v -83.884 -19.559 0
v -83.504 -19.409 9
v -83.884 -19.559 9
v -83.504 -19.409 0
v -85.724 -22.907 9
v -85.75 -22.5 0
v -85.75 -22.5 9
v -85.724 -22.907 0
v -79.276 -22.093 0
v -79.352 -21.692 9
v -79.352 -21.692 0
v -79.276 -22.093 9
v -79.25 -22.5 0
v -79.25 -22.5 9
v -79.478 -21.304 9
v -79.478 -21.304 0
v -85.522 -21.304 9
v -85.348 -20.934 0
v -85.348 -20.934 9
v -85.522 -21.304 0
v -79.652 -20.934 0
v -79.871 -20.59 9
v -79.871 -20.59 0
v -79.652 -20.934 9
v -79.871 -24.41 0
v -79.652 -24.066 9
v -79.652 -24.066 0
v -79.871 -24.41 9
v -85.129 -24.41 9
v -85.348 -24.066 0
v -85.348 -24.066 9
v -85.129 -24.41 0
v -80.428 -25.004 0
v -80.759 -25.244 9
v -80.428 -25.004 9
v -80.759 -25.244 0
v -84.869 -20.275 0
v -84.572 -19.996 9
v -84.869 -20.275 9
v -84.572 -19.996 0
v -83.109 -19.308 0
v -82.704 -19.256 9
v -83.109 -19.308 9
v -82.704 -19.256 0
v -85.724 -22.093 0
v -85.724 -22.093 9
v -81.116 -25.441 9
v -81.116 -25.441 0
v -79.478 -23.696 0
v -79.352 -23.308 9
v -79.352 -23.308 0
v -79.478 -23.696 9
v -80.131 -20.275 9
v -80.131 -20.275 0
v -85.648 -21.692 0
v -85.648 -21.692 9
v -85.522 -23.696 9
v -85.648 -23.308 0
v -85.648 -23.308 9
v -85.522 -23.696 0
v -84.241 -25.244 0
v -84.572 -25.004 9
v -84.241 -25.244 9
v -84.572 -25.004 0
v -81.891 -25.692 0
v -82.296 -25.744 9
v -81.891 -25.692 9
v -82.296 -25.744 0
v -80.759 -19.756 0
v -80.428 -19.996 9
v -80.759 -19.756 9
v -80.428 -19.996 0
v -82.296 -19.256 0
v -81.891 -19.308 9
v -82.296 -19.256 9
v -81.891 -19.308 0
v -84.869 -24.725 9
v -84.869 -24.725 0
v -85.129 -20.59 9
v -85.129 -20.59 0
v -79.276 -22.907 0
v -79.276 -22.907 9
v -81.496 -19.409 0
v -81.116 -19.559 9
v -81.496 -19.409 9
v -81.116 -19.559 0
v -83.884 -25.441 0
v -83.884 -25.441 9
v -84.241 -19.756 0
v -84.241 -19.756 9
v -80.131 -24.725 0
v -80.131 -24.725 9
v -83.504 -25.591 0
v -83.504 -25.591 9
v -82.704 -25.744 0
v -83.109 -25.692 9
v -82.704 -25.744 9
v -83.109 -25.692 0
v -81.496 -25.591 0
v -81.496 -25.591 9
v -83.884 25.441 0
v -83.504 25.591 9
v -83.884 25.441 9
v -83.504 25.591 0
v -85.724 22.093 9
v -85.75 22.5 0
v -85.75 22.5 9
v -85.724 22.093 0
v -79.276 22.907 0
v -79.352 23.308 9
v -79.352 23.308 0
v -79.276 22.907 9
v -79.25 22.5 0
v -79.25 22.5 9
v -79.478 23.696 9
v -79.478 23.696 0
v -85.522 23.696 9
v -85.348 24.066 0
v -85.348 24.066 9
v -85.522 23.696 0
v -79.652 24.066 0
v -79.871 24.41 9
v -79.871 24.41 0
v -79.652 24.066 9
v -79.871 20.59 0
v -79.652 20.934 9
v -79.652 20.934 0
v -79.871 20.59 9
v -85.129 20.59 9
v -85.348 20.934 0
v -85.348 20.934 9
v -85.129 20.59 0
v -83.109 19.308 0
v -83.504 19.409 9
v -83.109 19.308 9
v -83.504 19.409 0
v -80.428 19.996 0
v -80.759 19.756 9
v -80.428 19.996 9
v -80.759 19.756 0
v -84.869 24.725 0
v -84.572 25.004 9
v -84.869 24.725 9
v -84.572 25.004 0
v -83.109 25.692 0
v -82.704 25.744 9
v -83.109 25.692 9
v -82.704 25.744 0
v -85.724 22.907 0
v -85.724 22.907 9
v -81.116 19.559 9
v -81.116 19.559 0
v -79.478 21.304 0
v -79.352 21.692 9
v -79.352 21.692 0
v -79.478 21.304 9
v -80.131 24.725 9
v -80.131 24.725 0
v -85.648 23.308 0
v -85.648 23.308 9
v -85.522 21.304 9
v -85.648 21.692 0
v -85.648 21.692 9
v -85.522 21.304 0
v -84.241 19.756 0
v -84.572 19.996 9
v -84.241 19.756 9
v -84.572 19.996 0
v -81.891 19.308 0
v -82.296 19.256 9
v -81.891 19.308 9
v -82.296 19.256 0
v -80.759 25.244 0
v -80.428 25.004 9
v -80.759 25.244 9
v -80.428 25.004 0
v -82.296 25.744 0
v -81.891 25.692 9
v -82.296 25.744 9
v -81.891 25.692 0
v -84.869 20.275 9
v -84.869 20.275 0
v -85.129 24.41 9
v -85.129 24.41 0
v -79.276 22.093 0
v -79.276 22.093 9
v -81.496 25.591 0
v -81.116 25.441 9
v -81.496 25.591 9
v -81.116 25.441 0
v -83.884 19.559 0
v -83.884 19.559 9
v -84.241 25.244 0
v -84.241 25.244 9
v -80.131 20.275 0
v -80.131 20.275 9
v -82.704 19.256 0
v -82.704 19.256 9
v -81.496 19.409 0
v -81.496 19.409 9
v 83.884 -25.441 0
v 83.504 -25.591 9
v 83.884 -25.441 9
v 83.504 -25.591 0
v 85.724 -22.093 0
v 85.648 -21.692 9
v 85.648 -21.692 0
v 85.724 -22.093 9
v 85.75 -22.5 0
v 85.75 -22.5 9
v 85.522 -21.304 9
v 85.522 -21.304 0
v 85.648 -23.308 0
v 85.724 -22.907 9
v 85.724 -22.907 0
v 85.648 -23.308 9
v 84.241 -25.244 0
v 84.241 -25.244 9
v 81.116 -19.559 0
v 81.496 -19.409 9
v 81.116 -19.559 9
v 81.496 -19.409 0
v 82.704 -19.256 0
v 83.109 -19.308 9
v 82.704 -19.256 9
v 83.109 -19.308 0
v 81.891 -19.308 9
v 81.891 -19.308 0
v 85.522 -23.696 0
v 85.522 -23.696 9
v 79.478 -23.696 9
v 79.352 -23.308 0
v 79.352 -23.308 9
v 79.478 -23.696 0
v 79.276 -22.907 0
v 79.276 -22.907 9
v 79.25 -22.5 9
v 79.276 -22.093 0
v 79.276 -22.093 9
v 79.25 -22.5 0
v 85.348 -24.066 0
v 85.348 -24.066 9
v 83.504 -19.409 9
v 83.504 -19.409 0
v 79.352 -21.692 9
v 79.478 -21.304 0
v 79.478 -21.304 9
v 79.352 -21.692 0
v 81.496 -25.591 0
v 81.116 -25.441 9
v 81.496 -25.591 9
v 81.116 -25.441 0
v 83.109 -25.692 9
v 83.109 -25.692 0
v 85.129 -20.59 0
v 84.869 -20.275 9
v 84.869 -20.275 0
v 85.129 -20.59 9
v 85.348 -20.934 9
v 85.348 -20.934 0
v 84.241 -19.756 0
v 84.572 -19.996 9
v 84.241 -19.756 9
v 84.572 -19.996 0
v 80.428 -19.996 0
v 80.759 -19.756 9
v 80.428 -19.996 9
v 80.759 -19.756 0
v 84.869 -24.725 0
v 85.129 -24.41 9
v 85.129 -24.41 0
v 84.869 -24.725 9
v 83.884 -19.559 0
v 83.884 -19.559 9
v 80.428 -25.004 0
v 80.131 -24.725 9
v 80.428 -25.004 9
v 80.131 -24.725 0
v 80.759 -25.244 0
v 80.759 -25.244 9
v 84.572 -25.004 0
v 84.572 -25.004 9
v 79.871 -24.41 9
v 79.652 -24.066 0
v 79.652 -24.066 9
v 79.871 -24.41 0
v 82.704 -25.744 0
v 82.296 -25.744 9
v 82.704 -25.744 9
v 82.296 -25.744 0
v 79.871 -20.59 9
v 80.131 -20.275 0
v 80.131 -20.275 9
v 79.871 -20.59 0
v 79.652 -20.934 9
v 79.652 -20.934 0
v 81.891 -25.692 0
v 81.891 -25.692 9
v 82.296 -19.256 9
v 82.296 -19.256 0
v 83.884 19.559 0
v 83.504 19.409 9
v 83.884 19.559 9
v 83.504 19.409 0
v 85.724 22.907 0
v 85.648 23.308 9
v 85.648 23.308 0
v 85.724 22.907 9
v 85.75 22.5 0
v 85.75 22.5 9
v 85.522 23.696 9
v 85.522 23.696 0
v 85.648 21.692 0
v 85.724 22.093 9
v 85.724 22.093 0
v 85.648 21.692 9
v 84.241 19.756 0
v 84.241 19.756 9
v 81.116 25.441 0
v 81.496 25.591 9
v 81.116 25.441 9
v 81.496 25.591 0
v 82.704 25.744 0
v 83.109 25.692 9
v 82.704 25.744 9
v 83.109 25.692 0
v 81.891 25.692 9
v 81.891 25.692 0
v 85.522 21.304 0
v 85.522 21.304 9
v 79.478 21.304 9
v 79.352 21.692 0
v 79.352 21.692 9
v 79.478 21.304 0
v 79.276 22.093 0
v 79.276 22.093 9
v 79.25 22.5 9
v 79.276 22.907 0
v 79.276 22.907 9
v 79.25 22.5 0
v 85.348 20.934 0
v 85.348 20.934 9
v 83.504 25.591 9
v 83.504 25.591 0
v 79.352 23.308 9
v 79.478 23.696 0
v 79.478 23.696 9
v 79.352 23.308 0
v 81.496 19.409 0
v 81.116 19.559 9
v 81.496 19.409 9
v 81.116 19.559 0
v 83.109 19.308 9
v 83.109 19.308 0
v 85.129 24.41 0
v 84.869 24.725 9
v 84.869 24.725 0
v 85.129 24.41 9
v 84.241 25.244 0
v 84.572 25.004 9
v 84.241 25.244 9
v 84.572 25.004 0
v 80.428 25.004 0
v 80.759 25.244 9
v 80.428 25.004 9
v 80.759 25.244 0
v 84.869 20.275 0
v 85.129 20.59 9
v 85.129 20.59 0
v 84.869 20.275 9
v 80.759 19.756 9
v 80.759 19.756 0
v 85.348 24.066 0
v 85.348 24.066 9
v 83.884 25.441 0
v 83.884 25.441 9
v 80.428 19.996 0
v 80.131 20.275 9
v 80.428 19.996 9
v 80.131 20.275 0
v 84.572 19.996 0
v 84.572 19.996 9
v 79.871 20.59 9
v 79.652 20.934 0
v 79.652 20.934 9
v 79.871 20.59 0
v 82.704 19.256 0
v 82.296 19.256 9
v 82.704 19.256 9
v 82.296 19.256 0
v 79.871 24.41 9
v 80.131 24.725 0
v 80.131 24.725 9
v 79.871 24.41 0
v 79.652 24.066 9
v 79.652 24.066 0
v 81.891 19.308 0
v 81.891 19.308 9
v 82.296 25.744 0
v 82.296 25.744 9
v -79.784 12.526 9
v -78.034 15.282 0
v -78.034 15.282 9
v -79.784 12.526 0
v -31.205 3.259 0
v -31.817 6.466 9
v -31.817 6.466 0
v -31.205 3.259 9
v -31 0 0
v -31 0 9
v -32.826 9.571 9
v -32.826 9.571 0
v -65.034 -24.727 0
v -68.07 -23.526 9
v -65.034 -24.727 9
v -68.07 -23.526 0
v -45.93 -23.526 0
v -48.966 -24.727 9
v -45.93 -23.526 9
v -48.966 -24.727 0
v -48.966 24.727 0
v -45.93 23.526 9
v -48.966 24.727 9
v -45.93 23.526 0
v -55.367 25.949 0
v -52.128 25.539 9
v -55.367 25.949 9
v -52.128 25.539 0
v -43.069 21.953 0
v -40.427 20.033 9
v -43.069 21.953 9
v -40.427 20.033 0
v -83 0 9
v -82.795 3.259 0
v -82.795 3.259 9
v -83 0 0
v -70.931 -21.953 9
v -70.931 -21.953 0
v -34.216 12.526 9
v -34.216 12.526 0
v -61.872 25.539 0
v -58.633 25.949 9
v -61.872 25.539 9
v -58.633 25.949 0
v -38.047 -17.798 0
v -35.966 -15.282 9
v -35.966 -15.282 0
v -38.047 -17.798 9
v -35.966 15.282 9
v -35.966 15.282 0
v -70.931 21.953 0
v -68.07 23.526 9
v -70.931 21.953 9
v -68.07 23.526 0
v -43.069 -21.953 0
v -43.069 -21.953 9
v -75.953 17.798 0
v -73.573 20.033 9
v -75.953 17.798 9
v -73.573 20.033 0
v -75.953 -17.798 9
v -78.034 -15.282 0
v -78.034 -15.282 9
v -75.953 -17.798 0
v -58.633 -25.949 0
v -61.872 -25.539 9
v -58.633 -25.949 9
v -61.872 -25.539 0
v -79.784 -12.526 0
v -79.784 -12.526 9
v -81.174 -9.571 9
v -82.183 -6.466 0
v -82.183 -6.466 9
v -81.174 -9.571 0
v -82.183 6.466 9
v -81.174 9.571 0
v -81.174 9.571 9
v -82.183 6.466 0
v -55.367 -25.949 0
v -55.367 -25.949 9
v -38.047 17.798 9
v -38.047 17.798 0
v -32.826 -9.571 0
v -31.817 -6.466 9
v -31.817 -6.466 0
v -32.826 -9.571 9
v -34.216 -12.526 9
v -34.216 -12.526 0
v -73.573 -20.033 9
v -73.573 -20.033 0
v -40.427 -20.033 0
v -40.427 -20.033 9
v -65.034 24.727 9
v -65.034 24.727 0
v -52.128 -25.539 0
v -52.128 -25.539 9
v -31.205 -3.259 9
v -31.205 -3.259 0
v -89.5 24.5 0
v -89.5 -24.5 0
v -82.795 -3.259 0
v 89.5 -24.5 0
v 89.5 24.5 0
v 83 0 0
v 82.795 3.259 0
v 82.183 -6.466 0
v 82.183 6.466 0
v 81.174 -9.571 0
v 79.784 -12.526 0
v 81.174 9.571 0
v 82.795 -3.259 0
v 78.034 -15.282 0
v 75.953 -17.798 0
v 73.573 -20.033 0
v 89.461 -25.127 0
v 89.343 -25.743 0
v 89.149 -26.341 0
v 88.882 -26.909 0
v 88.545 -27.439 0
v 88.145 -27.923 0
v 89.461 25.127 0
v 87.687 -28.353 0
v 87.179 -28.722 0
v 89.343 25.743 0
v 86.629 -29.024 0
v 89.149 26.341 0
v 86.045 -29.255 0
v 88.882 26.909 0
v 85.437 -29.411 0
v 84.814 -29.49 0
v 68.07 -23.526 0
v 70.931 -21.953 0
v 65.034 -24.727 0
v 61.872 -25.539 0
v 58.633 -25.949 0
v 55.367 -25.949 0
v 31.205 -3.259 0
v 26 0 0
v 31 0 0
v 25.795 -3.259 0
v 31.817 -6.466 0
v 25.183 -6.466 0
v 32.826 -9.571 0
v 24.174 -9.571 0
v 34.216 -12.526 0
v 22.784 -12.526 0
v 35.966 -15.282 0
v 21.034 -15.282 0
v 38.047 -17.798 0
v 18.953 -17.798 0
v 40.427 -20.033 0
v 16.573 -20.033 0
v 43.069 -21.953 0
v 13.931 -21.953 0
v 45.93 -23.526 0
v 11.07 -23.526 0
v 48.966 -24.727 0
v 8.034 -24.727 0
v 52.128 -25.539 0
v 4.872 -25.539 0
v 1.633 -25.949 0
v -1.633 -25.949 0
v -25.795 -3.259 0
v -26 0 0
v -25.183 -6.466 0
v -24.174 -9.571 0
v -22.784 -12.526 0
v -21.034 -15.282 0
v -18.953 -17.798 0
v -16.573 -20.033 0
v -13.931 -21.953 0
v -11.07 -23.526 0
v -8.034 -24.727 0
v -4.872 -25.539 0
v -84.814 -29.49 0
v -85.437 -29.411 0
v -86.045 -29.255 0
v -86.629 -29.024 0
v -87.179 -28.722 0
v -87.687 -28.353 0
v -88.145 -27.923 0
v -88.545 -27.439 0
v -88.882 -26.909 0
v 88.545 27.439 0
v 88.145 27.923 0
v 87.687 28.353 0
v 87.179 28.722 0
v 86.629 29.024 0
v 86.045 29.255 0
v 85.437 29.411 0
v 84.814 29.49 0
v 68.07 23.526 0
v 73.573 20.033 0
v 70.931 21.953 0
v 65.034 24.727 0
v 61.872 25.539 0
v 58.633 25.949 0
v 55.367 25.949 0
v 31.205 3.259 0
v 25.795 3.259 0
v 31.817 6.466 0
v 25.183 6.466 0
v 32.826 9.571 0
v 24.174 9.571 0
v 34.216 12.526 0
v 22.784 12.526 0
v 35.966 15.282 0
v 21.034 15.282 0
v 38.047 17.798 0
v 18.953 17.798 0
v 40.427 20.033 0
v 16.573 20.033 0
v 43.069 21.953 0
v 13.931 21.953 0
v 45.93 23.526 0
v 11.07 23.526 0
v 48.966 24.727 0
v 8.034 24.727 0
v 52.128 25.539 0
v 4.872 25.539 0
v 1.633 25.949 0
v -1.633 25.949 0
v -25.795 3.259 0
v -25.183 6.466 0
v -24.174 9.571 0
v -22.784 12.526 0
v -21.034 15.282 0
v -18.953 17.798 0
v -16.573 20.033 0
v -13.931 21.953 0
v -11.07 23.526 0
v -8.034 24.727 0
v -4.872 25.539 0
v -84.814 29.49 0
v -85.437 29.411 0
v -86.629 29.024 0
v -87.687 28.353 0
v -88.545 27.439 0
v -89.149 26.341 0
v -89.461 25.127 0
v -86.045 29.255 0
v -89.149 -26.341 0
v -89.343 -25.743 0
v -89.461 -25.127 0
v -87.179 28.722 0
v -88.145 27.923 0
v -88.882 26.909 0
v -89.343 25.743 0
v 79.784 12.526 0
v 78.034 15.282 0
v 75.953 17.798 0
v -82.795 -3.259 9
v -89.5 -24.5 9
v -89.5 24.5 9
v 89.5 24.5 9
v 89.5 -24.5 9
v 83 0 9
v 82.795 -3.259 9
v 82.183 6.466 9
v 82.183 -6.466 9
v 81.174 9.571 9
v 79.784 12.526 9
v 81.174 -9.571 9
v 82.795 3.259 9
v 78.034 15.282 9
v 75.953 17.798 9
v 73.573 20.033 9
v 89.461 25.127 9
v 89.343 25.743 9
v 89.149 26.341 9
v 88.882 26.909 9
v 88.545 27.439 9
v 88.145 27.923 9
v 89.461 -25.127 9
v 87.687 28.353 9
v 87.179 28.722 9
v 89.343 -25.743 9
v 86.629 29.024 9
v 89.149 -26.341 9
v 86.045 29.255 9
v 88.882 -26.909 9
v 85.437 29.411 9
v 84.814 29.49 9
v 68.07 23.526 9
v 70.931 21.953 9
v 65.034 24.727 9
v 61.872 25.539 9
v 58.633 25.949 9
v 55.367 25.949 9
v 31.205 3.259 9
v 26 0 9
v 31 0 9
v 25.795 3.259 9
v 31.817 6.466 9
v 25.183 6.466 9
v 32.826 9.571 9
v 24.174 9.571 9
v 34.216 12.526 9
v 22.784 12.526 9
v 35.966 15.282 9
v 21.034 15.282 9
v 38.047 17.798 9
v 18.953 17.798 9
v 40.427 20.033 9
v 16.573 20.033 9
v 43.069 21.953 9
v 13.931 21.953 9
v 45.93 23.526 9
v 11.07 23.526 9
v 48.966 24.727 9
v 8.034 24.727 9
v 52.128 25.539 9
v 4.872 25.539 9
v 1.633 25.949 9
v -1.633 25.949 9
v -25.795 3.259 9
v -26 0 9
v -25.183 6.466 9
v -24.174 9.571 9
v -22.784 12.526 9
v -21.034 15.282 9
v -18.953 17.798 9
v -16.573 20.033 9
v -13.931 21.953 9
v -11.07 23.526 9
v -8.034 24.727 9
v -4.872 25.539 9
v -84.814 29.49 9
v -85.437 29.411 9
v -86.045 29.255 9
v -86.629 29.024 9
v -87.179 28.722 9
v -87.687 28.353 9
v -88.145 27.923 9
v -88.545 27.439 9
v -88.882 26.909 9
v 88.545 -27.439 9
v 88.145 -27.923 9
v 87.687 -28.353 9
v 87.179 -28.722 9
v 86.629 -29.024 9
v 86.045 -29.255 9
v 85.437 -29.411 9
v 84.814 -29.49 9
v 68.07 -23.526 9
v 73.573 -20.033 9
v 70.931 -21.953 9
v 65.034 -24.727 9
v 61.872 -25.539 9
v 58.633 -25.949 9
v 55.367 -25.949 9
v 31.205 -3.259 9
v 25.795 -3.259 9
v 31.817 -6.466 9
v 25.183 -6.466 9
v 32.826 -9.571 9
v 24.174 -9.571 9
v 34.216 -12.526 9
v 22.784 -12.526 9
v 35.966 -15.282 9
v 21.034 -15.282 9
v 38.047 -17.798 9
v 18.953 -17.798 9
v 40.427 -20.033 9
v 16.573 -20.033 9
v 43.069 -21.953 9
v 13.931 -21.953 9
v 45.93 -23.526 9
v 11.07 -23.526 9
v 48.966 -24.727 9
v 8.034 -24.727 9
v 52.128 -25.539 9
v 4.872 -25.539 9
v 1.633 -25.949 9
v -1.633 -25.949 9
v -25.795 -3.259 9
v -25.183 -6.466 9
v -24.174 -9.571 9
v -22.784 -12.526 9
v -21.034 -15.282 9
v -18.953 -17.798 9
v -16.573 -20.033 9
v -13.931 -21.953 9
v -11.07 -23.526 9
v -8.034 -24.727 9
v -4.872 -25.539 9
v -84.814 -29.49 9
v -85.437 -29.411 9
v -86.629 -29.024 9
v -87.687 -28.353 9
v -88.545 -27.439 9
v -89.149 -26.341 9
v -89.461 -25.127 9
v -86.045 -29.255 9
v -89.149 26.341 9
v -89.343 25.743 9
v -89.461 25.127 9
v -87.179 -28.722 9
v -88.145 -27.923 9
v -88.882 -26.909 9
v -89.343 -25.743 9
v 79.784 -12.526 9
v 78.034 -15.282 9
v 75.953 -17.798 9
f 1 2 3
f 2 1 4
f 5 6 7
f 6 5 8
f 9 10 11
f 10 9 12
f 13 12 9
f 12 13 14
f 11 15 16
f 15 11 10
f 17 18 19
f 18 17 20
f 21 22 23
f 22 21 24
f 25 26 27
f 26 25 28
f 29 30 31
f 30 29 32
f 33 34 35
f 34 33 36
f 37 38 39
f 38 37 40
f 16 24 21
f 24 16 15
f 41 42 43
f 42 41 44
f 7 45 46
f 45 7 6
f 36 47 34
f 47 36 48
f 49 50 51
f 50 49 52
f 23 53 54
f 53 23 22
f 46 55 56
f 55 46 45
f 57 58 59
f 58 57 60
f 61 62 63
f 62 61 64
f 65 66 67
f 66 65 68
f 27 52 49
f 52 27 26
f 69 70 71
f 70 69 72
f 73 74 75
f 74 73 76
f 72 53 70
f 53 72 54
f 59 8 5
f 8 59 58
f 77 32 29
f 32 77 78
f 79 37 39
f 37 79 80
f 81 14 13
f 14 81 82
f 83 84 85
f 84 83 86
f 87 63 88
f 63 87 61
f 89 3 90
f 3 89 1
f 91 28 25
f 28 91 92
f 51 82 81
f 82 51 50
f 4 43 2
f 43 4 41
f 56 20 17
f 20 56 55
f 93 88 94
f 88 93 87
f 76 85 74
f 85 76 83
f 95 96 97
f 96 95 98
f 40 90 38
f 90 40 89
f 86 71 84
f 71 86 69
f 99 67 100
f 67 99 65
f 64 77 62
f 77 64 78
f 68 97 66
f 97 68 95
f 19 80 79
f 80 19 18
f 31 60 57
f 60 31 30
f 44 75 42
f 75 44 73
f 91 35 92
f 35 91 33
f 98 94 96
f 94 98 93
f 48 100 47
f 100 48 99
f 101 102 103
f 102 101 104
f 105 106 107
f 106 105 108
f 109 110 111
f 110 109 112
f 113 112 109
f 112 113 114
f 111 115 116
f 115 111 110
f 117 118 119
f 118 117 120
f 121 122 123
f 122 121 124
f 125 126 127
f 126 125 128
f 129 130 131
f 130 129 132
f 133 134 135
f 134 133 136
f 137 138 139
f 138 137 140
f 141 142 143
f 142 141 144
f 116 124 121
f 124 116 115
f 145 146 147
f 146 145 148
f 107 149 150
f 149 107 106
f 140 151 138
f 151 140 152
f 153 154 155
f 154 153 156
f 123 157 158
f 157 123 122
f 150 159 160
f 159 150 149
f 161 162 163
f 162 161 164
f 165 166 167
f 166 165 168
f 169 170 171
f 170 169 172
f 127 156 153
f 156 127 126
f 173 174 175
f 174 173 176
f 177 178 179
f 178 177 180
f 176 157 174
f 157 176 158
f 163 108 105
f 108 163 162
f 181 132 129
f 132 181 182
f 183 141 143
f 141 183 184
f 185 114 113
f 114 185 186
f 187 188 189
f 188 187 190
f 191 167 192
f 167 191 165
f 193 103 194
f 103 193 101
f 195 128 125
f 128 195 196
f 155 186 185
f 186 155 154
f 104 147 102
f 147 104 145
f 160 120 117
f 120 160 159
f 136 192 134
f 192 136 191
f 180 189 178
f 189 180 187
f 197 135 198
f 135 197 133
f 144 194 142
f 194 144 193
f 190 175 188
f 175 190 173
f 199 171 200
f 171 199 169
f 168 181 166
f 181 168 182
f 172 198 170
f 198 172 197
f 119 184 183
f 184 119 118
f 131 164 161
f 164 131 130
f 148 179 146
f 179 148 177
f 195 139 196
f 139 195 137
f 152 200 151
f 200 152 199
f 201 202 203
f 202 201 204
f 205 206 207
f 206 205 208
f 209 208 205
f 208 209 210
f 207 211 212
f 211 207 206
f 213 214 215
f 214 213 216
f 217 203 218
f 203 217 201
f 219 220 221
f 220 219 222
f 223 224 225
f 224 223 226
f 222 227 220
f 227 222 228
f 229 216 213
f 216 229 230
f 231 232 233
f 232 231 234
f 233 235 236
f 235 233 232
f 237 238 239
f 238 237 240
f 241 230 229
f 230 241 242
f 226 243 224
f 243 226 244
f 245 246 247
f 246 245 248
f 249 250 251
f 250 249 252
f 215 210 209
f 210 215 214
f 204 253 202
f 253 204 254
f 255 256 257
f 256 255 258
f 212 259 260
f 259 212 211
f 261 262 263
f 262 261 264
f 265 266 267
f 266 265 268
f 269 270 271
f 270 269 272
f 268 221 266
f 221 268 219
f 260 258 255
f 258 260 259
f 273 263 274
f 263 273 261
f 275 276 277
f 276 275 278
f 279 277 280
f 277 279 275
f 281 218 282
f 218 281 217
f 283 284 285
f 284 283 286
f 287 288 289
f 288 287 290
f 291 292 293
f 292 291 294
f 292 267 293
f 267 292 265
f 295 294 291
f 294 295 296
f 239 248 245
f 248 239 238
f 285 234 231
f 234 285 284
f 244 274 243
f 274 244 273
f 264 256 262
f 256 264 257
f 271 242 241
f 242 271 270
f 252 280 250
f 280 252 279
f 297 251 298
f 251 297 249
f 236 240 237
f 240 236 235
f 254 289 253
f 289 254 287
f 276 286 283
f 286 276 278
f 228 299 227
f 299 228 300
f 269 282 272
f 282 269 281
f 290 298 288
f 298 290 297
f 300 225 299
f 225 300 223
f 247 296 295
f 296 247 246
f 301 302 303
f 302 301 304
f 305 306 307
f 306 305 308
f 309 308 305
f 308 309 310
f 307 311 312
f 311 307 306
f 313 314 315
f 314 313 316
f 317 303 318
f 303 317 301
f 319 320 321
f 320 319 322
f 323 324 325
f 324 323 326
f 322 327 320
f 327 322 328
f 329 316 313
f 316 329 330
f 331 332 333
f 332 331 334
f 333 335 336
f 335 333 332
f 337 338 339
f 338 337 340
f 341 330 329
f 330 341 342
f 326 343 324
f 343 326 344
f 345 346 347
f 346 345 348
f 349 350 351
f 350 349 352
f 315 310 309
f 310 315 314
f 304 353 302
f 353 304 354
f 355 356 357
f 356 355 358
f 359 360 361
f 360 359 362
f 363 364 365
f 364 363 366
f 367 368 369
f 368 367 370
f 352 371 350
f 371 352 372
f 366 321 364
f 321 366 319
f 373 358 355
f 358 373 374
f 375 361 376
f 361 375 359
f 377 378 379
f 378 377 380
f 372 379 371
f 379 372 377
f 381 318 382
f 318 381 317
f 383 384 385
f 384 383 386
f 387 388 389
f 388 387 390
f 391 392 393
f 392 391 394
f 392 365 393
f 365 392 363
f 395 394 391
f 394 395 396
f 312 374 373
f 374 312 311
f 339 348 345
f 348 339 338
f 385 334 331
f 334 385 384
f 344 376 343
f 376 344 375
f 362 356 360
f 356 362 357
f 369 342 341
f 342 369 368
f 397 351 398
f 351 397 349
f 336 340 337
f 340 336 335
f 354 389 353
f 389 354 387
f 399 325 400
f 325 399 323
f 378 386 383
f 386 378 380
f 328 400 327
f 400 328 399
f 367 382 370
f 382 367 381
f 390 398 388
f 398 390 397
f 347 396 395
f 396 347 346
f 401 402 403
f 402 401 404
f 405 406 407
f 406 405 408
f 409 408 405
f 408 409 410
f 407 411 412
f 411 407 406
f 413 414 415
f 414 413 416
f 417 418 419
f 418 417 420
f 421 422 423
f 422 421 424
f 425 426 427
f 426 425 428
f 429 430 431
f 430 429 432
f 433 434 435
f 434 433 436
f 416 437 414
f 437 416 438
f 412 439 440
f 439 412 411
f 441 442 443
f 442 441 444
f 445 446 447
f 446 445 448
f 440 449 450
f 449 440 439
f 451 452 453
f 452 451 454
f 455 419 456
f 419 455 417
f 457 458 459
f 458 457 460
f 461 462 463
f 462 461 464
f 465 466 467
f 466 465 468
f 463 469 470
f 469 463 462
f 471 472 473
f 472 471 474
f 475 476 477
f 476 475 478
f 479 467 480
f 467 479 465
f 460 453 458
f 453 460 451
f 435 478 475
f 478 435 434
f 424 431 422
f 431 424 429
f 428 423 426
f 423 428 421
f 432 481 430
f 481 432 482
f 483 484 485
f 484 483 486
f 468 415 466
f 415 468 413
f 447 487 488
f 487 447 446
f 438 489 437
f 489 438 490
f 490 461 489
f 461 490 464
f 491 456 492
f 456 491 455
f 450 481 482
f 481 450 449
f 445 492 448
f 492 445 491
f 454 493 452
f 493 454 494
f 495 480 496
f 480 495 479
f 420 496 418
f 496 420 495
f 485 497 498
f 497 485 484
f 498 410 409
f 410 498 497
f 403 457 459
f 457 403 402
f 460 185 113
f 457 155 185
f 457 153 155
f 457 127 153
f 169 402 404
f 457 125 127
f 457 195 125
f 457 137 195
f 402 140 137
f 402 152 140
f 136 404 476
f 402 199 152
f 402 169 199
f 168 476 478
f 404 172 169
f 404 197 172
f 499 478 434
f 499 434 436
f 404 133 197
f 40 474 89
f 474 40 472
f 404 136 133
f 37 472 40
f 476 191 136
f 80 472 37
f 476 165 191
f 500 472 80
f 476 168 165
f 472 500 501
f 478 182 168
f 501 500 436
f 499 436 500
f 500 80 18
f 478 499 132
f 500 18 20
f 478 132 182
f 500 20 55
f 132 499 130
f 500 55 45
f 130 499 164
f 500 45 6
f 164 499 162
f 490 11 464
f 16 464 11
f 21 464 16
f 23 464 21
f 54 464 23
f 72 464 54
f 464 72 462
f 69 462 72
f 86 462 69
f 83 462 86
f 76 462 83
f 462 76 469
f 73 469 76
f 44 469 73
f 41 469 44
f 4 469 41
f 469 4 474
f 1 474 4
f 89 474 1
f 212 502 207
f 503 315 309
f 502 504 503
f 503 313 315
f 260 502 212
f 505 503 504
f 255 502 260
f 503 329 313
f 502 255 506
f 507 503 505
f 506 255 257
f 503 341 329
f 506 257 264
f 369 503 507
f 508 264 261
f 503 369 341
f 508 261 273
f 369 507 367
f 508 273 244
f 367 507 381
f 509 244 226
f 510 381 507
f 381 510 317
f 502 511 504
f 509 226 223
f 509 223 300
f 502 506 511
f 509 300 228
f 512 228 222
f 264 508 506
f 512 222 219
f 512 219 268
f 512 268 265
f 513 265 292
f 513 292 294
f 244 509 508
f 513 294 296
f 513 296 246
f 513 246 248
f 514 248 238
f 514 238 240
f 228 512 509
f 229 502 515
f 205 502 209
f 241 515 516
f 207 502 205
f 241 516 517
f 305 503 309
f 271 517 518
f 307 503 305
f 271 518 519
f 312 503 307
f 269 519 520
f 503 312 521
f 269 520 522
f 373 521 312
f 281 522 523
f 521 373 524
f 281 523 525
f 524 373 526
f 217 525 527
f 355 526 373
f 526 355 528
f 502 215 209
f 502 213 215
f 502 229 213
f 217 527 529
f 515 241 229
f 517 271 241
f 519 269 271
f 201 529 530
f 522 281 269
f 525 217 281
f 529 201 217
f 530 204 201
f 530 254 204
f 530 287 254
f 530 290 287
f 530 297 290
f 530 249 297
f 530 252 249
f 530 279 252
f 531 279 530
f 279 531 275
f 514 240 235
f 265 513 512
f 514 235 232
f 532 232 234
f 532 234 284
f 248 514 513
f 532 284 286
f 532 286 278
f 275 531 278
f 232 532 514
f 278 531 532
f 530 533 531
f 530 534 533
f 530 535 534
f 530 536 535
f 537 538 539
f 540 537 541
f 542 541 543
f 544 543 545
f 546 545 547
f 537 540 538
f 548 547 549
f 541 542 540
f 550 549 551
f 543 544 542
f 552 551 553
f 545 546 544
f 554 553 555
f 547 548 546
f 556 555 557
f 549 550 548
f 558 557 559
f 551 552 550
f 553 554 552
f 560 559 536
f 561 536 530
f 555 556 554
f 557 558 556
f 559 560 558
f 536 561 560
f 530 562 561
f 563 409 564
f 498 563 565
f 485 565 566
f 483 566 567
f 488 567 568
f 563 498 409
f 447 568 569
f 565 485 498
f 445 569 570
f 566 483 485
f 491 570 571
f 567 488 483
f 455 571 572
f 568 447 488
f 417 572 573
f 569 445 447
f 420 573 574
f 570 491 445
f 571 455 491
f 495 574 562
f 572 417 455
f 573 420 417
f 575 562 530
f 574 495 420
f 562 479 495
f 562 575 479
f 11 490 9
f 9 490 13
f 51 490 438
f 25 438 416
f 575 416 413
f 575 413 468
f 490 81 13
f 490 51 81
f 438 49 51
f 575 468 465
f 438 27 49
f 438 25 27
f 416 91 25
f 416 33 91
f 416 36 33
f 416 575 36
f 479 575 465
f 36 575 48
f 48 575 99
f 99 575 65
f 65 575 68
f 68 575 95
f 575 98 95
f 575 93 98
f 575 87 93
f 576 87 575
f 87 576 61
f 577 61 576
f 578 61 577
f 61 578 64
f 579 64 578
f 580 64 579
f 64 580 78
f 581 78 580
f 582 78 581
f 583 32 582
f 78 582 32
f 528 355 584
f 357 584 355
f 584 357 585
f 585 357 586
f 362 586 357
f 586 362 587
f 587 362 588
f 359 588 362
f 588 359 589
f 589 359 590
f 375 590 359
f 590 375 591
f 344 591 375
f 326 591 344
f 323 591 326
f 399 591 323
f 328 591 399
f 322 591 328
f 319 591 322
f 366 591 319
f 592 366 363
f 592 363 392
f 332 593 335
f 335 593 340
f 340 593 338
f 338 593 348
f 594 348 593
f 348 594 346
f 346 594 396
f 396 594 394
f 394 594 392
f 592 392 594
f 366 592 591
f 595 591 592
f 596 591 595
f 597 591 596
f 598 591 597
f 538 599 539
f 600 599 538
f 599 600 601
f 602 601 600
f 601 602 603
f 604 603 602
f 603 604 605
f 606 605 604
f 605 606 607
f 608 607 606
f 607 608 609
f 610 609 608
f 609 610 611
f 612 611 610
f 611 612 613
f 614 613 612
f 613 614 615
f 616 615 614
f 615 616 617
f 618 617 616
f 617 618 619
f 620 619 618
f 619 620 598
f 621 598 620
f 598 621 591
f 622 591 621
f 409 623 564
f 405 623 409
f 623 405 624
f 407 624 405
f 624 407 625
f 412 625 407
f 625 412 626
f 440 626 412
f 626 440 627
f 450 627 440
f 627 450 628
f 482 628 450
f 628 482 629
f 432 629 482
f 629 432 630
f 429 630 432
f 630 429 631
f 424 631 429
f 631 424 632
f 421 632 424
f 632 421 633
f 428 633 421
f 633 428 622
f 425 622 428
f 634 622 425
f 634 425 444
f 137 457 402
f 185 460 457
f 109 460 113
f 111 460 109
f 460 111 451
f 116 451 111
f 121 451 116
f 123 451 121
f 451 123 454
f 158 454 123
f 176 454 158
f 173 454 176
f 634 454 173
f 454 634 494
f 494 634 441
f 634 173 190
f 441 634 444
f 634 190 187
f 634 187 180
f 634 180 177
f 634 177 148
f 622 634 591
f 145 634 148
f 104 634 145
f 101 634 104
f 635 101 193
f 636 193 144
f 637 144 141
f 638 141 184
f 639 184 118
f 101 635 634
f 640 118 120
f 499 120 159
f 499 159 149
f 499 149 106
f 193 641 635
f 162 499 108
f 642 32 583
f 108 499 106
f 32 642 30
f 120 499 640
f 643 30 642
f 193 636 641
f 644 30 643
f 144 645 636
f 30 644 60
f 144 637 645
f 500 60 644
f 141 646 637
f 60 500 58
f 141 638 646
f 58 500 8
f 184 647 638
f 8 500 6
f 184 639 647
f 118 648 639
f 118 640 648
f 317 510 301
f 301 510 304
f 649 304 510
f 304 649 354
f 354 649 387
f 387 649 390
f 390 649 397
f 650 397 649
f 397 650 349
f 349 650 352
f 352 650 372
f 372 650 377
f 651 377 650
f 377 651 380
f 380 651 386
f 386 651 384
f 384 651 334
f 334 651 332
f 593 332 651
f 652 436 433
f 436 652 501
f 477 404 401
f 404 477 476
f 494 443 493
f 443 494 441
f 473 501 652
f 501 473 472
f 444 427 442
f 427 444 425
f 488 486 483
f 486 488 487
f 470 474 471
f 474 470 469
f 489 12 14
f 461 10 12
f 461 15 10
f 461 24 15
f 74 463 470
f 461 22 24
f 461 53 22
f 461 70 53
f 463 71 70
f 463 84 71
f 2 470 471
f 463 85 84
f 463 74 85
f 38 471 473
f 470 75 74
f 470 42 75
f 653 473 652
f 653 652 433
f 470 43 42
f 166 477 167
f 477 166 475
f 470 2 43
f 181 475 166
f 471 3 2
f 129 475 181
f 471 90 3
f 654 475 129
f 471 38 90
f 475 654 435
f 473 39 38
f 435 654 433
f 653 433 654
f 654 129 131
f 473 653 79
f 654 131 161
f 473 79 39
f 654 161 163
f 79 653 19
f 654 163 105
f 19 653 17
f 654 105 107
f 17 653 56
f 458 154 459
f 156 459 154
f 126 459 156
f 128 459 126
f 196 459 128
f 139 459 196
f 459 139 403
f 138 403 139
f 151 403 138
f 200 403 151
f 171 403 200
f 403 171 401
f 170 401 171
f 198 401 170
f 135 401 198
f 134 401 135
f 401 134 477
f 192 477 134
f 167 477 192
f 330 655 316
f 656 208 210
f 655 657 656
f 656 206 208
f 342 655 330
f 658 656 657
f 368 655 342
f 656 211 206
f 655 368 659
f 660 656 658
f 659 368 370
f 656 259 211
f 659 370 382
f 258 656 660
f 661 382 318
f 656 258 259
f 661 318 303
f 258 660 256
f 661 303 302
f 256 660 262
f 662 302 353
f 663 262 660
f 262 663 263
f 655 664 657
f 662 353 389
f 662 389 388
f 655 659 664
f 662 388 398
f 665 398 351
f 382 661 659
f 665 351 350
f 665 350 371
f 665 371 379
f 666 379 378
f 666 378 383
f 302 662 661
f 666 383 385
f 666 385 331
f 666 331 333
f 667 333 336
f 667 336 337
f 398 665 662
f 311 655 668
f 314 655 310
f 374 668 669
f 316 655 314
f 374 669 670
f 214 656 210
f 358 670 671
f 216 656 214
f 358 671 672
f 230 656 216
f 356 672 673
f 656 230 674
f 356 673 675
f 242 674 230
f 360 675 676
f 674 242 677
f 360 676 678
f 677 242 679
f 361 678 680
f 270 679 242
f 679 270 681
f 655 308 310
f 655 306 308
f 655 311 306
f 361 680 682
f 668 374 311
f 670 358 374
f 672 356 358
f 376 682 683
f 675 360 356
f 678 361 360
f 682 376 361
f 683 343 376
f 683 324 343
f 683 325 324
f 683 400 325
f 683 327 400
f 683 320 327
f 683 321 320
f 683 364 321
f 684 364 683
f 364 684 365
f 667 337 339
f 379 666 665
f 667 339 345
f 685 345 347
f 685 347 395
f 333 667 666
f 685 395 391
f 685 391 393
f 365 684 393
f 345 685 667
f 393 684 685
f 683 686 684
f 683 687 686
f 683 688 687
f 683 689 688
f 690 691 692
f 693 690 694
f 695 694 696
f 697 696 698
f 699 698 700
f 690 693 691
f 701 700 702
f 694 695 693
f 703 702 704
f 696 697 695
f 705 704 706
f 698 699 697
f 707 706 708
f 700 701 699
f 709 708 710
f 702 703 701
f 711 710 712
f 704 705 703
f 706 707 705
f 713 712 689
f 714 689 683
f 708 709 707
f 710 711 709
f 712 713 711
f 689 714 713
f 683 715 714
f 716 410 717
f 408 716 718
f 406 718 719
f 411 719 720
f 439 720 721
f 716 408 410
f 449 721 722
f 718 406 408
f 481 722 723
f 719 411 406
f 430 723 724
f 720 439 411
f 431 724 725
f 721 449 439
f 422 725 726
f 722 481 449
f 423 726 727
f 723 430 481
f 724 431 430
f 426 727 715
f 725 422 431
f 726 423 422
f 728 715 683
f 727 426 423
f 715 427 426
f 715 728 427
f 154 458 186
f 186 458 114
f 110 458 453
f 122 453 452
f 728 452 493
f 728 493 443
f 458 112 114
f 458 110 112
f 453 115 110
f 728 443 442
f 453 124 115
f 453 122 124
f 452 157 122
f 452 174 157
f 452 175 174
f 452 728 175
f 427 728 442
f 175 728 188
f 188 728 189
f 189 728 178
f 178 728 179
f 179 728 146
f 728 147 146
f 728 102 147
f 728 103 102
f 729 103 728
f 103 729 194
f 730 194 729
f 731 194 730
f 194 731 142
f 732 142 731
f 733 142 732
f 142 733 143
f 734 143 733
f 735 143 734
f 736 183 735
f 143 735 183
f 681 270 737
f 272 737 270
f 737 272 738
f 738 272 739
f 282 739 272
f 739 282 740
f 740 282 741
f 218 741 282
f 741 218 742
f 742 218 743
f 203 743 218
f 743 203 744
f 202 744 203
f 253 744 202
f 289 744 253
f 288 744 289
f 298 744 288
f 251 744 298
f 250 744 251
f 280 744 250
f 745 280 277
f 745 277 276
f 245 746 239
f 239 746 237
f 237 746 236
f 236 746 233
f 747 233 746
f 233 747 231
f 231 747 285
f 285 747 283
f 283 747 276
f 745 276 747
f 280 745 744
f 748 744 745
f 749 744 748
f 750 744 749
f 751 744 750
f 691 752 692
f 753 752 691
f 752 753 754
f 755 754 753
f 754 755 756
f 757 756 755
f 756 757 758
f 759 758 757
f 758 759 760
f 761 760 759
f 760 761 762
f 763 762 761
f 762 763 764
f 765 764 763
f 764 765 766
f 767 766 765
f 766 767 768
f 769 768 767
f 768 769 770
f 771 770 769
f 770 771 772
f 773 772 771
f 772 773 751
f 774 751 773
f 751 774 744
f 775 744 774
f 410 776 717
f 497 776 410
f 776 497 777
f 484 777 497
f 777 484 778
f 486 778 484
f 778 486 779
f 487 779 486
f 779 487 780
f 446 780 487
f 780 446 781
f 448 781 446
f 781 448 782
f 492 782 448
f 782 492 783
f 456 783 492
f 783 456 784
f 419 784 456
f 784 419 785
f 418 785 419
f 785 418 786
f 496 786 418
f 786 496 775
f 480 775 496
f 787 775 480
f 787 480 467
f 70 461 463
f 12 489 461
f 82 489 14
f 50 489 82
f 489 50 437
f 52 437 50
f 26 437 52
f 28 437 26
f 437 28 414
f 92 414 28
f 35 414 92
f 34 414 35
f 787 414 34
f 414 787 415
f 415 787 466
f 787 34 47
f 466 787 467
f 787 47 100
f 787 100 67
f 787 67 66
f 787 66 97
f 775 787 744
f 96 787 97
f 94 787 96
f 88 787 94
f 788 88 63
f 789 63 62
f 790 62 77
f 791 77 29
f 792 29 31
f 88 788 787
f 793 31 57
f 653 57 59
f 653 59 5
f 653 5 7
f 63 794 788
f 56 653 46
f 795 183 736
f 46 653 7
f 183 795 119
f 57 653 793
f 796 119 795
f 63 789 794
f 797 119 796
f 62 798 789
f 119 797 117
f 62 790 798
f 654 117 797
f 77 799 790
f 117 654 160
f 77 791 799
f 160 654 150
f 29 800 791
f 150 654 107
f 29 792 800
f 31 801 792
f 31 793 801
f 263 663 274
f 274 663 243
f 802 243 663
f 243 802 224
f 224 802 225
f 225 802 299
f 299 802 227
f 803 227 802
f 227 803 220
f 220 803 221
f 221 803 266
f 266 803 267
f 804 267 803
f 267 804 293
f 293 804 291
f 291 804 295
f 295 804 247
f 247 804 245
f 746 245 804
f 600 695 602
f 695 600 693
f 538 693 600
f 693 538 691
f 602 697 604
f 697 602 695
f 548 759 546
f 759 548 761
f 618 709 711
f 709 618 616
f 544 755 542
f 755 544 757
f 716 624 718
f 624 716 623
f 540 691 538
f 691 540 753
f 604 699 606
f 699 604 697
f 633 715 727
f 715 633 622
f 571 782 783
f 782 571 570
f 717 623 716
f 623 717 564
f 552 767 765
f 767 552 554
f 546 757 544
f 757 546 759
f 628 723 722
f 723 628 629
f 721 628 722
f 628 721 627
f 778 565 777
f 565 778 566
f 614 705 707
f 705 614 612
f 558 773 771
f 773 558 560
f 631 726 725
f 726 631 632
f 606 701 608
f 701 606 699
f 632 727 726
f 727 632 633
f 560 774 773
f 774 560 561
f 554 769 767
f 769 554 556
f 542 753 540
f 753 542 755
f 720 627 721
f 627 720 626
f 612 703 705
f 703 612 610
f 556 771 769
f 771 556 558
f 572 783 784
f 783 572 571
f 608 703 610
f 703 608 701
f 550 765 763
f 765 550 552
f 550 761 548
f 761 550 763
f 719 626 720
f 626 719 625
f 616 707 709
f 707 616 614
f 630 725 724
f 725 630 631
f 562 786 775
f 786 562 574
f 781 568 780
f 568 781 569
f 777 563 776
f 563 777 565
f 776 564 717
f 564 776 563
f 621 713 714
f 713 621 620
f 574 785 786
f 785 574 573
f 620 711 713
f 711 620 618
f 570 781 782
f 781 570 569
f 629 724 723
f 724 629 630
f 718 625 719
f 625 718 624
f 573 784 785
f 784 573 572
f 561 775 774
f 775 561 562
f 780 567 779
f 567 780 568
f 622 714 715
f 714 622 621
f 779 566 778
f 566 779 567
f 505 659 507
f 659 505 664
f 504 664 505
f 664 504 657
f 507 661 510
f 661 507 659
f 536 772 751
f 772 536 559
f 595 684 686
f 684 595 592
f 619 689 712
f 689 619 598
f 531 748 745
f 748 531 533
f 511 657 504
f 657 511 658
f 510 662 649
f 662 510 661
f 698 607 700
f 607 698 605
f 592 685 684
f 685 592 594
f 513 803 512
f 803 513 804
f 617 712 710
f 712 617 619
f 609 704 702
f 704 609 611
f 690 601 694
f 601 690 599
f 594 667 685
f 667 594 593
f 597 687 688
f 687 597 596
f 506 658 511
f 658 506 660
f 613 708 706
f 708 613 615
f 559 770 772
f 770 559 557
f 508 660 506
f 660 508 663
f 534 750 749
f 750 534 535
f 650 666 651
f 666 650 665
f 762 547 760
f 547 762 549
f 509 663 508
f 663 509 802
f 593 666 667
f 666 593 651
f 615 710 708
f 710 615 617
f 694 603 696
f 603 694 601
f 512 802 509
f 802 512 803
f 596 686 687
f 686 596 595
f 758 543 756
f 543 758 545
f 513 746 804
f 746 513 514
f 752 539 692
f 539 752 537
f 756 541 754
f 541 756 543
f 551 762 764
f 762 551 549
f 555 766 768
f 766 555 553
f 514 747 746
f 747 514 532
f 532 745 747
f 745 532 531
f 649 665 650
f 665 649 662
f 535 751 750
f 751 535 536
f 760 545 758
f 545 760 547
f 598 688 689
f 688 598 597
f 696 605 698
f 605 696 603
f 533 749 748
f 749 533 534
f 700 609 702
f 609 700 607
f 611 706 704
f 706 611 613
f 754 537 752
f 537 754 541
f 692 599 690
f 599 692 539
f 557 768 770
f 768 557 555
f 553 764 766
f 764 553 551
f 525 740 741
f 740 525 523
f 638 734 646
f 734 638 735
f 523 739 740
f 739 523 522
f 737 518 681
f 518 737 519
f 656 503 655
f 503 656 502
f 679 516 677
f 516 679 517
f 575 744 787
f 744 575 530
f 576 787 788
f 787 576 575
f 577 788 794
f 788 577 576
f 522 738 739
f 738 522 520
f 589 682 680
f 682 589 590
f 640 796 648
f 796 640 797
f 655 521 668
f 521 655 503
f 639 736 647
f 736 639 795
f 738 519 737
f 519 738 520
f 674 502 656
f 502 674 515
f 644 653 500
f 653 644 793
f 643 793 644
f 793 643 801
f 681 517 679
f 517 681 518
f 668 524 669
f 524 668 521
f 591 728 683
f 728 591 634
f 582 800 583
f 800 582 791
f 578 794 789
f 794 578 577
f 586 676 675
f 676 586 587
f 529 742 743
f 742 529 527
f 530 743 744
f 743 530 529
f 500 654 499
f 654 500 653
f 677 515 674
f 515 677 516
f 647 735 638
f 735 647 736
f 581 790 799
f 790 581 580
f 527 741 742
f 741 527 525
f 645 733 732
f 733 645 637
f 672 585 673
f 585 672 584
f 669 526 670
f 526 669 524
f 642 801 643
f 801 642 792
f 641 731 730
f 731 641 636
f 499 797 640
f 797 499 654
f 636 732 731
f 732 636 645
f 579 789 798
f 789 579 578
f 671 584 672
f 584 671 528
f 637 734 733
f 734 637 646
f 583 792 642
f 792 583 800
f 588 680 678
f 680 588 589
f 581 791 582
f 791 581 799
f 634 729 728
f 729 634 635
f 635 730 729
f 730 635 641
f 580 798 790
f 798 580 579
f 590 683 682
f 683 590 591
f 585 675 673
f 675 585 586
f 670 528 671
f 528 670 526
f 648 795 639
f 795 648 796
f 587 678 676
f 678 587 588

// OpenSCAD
$fn = 50;


difference() {
	union() {
		hull() {
			translate(v = [-84.5000000000, 24.5000000000, 0]) {
				cylinder(h = 9, r = 5);
			}
			translate(v = [84.5000000000, 24.5000000000, 0]) {
				cylinder(h = 9, r = 5);
			}
			translate(v = [-84.5000000000, -24.5000000000, 0]) {
				cylinder(h = 9, r = 5);
			}
			translate(v = [84.5000000000, -24.5000000000, 0]) {
				cylinder(h = 9, r = 5);
			}
		}
	}
	union() {
		#translate(v = [-82.5000000000, -22.5000000000, -100.0000000000]) {
			cylinder(h = 200, r = 3.2500000000);
		}
		#translate(v = [-82.5000000000, 22.5000000000, -100.0000000000]) {
			cylinder(h = 200, r = 3.2500000000);
		}
		#translate(v = [82.5000000000, -22.5000000000, -100.0000000000]) {
			cylinder(h = 200, r = 3.2500000000);
		}
		#translate(v = [82.5000000000, 22.5000000000, -100.0000000000]) {
			cylinder(h = 200, r = 3.2500000000);
		}
		#translate(v = [-57.0000000000, 0, 0]) {
			cylinder(h = 9, r = 26.0000000000);
		}
		#cylinder(h = 9, r = 26.0000000000);
		#translate(v = [57.0000000000, 0, 0]) {
			cylinder(h = 9, r = 26.0000000000);
		}
	}
}
